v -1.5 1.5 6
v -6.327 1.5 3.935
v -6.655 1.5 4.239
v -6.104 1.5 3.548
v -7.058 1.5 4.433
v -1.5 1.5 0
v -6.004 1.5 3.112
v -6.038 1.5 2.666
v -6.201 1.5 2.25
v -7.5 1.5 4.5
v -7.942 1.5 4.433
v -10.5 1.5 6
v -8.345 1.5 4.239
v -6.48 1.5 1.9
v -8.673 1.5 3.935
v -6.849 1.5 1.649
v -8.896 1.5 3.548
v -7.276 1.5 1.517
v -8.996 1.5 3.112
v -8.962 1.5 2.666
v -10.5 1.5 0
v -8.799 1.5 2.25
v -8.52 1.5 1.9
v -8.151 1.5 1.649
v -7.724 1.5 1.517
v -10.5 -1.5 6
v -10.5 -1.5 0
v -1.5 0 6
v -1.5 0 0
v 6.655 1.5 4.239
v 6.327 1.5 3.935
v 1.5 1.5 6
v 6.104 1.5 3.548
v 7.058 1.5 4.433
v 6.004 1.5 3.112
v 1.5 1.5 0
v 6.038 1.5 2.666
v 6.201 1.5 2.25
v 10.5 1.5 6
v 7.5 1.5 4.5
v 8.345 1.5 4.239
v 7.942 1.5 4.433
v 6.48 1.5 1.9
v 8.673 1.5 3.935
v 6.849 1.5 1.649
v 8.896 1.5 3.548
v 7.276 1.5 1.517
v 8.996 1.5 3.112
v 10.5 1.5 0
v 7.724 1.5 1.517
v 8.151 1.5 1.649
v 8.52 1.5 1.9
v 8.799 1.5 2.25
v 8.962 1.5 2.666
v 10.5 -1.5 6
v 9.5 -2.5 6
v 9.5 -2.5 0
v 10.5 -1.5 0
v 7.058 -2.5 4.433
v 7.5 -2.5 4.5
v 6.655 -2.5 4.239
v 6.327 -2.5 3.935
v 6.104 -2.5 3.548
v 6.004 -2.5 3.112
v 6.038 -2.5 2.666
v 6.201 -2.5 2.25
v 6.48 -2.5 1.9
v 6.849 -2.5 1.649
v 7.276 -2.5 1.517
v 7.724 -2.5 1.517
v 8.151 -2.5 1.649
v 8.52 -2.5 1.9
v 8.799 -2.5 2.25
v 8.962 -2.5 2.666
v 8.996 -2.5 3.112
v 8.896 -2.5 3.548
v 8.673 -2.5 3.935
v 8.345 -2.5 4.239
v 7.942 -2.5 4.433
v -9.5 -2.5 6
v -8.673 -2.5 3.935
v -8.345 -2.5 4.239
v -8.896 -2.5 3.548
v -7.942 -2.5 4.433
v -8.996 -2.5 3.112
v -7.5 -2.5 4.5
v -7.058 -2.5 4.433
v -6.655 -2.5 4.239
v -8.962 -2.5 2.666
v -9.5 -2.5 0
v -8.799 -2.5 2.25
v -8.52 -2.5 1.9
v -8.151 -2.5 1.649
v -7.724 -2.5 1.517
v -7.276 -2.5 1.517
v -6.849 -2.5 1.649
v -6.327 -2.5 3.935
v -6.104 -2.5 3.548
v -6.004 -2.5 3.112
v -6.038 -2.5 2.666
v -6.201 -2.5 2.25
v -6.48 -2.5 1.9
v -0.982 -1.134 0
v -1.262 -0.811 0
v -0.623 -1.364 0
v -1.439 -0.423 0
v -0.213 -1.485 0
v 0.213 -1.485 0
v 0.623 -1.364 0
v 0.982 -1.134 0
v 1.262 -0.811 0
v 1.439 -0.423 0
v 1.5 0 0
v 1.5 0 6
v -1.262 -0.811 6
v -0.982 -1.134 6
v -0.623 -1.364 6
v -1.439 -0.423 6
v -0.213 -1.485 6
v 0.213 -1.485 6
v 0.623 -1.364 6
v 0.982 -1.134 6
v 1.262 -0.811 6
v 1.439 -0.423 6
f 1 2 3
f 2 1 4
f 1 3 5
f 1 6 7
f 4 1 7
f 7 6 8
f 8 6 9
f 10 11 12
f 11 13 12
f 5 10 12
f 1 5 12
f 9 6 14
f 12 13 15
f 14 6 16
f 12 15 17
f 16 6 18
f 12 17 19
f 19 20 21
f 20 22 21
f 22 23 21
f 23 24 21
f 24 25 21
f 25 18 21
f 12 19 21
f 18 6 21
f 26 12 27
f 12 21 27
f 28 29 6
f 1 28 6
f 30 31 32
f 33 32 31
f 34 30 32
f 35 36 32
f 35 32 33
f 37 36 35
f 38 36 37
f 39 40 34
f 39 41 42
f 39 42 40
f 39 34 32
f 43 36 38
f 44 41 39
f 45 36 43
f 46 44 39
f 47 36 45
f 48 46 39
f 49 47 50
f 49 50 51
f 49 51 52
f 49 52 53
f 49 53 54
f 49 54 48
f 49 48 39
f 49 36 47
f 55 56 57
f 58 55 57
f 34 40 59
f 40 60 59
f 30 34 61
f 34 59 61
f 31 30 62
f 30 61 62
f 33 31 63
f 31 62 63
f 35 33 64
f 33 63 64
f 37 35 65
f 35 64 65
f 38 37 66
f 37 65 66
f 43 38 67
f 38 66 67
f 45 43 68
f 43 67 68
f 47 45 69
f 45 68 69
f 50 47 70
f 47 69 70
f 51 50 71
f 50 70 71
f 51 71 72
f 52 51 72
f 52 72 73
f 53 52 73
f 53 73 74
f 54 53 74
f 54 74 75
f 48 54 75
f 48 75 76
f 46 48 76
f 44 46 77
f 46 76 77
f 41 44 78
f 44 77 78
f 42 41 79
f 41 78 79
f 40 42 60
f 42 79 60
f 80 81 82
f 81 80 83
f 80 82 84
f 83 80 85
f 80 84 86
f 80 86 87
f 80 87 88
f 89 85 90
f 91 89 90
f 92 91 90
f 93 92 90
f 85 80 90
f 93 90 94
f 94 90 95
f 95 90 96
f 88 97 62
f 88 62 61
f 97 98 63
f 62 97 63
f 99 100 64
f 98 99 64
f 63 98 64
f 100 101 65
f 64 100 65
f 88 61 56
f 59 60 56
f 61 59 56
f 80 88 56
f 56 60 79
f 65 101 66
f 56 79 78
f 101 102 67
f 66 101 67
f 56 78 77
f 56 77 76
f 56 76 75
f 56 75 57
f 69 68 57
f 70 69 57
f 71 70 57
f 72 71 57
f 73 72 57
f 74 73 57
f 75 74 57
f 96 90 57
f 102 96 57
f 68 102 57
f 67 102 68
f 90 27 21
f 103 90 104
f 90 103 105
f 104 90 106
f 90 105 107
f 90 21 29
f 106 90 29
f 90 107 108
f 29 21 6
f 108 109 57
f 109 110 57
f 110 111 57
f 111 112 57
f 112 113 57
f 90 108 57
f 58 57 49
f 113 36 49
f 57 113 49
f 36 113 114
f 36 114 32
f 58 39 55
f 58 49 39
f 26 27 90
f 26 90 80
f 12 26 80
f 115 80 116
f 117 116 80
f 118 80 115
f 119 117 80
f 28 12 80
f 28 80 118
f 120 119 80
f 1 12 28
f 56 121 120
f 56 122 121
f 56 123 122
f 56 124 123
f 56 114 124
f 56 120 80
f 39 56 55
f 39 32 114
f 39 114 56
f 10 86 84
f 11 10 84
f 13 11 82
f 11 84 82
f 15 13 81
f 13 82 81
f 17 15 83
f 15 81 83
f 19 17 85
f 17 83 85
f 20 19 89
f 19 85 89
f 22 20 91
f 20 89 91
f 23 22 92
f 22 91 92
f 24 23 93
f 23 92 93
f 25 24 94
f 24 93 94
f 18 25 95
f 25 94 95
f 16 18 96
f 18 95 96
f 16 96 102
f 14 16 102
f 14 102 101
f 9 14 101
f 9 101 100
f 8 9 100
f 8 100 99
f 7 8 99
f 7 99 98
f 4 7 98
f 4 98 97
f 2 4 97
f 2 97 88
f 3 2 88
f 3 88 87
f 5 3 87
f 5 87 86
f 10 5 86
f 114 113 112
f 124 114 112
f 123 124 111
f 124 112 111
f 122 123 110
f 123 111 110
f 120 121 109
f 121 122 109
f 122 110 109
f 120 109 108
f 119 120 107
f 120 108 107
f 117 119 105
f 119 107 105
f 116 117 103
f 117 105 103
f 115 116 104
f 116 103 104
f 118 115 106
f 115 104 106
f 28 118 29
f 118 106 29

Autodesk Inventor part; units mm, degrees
ref_plane "YZ Plane" through (0, 0, 0) normal (1, 0, 0) x (0, 1, 0)
ref_plane "XZ Plane" through (0, 0, 0) normal (0, 1, 0) x (-1, 0, 0)
ref_plane "XY Plane" through (0, 0, 0) normal (0, 0, 1) x (1, 0, 0)
sketch "Sketch1" plane through (0, 0, 0) normal (0, 0, 1) x (1, 0, 0)
  circle A0 centre (0, 0) radius 1.5
  line L0 (-10.5, -2.5) -> (10.5, -2.5)
  line L1 (-1.5, 0) -> (-1.5, 1.5)
  line L2 (-1.5, 1.5) -> (-10.5, 1.5)
  line L3 (-10.5, 1.5) -> (-10.5, -2.5)
  line L4 (1.5, 0) -> (1.5, 1.5)
  line L5 (1.5, 1.5) -> (10.5, 1.5)
  line L6 (10.5, 1.5) -> (10.5, -2.5)
  dimension "d0" = 3
  dimension "d1" = 21
  dimension "d17" = 2.5
extrude "Extrusion1" add sketch "Sketch1" along normal blind 6 contours L4 L5 L6 L0 L3 L2 L1 A0
chamfer "Chamfer1" distance 1 angle 45 2 edges at (10.5, -2.5, 3) (-10.5, -2.5, 3)
sketch "Sketch3" plane through (-10.5, 1.5, 0) normal (0, 1, 0) x (1, 0, 0)
  line L0 (9, 0) -> (0, 0) projected
  line L1 (0, 0) -> (0, -6) projected
  line L2 (9, -6) -> (0, -6) projected
  line L3 (9, 0) -> (9, -6) projected
  line L4 (21, 0) -> (12, 0) projected
  line L5 (12, 0) -> (12, -6) projected
  line L6 (21, -6) -> (12, -6) projected
  line L7 (21, 0) -> (21, -6) projected
  point P0 (10.5, 0)
  point P1 (3, -3)
  point P2 (18, -3)
  point P3 (0, -3)
  point P4 (21, -3)
  dimension "d18" = 7.5
  dimension "d19" = 7.5
hole "Hole2" at (-7.5, 1.5, 3) at (7.5, 1.5, 3) direction (0, -1, 0) diameter 3 end through all
equation "\"d19\" = d18"
properties part number "Idler Thermistor Clamp" material "ABS Plastic"
